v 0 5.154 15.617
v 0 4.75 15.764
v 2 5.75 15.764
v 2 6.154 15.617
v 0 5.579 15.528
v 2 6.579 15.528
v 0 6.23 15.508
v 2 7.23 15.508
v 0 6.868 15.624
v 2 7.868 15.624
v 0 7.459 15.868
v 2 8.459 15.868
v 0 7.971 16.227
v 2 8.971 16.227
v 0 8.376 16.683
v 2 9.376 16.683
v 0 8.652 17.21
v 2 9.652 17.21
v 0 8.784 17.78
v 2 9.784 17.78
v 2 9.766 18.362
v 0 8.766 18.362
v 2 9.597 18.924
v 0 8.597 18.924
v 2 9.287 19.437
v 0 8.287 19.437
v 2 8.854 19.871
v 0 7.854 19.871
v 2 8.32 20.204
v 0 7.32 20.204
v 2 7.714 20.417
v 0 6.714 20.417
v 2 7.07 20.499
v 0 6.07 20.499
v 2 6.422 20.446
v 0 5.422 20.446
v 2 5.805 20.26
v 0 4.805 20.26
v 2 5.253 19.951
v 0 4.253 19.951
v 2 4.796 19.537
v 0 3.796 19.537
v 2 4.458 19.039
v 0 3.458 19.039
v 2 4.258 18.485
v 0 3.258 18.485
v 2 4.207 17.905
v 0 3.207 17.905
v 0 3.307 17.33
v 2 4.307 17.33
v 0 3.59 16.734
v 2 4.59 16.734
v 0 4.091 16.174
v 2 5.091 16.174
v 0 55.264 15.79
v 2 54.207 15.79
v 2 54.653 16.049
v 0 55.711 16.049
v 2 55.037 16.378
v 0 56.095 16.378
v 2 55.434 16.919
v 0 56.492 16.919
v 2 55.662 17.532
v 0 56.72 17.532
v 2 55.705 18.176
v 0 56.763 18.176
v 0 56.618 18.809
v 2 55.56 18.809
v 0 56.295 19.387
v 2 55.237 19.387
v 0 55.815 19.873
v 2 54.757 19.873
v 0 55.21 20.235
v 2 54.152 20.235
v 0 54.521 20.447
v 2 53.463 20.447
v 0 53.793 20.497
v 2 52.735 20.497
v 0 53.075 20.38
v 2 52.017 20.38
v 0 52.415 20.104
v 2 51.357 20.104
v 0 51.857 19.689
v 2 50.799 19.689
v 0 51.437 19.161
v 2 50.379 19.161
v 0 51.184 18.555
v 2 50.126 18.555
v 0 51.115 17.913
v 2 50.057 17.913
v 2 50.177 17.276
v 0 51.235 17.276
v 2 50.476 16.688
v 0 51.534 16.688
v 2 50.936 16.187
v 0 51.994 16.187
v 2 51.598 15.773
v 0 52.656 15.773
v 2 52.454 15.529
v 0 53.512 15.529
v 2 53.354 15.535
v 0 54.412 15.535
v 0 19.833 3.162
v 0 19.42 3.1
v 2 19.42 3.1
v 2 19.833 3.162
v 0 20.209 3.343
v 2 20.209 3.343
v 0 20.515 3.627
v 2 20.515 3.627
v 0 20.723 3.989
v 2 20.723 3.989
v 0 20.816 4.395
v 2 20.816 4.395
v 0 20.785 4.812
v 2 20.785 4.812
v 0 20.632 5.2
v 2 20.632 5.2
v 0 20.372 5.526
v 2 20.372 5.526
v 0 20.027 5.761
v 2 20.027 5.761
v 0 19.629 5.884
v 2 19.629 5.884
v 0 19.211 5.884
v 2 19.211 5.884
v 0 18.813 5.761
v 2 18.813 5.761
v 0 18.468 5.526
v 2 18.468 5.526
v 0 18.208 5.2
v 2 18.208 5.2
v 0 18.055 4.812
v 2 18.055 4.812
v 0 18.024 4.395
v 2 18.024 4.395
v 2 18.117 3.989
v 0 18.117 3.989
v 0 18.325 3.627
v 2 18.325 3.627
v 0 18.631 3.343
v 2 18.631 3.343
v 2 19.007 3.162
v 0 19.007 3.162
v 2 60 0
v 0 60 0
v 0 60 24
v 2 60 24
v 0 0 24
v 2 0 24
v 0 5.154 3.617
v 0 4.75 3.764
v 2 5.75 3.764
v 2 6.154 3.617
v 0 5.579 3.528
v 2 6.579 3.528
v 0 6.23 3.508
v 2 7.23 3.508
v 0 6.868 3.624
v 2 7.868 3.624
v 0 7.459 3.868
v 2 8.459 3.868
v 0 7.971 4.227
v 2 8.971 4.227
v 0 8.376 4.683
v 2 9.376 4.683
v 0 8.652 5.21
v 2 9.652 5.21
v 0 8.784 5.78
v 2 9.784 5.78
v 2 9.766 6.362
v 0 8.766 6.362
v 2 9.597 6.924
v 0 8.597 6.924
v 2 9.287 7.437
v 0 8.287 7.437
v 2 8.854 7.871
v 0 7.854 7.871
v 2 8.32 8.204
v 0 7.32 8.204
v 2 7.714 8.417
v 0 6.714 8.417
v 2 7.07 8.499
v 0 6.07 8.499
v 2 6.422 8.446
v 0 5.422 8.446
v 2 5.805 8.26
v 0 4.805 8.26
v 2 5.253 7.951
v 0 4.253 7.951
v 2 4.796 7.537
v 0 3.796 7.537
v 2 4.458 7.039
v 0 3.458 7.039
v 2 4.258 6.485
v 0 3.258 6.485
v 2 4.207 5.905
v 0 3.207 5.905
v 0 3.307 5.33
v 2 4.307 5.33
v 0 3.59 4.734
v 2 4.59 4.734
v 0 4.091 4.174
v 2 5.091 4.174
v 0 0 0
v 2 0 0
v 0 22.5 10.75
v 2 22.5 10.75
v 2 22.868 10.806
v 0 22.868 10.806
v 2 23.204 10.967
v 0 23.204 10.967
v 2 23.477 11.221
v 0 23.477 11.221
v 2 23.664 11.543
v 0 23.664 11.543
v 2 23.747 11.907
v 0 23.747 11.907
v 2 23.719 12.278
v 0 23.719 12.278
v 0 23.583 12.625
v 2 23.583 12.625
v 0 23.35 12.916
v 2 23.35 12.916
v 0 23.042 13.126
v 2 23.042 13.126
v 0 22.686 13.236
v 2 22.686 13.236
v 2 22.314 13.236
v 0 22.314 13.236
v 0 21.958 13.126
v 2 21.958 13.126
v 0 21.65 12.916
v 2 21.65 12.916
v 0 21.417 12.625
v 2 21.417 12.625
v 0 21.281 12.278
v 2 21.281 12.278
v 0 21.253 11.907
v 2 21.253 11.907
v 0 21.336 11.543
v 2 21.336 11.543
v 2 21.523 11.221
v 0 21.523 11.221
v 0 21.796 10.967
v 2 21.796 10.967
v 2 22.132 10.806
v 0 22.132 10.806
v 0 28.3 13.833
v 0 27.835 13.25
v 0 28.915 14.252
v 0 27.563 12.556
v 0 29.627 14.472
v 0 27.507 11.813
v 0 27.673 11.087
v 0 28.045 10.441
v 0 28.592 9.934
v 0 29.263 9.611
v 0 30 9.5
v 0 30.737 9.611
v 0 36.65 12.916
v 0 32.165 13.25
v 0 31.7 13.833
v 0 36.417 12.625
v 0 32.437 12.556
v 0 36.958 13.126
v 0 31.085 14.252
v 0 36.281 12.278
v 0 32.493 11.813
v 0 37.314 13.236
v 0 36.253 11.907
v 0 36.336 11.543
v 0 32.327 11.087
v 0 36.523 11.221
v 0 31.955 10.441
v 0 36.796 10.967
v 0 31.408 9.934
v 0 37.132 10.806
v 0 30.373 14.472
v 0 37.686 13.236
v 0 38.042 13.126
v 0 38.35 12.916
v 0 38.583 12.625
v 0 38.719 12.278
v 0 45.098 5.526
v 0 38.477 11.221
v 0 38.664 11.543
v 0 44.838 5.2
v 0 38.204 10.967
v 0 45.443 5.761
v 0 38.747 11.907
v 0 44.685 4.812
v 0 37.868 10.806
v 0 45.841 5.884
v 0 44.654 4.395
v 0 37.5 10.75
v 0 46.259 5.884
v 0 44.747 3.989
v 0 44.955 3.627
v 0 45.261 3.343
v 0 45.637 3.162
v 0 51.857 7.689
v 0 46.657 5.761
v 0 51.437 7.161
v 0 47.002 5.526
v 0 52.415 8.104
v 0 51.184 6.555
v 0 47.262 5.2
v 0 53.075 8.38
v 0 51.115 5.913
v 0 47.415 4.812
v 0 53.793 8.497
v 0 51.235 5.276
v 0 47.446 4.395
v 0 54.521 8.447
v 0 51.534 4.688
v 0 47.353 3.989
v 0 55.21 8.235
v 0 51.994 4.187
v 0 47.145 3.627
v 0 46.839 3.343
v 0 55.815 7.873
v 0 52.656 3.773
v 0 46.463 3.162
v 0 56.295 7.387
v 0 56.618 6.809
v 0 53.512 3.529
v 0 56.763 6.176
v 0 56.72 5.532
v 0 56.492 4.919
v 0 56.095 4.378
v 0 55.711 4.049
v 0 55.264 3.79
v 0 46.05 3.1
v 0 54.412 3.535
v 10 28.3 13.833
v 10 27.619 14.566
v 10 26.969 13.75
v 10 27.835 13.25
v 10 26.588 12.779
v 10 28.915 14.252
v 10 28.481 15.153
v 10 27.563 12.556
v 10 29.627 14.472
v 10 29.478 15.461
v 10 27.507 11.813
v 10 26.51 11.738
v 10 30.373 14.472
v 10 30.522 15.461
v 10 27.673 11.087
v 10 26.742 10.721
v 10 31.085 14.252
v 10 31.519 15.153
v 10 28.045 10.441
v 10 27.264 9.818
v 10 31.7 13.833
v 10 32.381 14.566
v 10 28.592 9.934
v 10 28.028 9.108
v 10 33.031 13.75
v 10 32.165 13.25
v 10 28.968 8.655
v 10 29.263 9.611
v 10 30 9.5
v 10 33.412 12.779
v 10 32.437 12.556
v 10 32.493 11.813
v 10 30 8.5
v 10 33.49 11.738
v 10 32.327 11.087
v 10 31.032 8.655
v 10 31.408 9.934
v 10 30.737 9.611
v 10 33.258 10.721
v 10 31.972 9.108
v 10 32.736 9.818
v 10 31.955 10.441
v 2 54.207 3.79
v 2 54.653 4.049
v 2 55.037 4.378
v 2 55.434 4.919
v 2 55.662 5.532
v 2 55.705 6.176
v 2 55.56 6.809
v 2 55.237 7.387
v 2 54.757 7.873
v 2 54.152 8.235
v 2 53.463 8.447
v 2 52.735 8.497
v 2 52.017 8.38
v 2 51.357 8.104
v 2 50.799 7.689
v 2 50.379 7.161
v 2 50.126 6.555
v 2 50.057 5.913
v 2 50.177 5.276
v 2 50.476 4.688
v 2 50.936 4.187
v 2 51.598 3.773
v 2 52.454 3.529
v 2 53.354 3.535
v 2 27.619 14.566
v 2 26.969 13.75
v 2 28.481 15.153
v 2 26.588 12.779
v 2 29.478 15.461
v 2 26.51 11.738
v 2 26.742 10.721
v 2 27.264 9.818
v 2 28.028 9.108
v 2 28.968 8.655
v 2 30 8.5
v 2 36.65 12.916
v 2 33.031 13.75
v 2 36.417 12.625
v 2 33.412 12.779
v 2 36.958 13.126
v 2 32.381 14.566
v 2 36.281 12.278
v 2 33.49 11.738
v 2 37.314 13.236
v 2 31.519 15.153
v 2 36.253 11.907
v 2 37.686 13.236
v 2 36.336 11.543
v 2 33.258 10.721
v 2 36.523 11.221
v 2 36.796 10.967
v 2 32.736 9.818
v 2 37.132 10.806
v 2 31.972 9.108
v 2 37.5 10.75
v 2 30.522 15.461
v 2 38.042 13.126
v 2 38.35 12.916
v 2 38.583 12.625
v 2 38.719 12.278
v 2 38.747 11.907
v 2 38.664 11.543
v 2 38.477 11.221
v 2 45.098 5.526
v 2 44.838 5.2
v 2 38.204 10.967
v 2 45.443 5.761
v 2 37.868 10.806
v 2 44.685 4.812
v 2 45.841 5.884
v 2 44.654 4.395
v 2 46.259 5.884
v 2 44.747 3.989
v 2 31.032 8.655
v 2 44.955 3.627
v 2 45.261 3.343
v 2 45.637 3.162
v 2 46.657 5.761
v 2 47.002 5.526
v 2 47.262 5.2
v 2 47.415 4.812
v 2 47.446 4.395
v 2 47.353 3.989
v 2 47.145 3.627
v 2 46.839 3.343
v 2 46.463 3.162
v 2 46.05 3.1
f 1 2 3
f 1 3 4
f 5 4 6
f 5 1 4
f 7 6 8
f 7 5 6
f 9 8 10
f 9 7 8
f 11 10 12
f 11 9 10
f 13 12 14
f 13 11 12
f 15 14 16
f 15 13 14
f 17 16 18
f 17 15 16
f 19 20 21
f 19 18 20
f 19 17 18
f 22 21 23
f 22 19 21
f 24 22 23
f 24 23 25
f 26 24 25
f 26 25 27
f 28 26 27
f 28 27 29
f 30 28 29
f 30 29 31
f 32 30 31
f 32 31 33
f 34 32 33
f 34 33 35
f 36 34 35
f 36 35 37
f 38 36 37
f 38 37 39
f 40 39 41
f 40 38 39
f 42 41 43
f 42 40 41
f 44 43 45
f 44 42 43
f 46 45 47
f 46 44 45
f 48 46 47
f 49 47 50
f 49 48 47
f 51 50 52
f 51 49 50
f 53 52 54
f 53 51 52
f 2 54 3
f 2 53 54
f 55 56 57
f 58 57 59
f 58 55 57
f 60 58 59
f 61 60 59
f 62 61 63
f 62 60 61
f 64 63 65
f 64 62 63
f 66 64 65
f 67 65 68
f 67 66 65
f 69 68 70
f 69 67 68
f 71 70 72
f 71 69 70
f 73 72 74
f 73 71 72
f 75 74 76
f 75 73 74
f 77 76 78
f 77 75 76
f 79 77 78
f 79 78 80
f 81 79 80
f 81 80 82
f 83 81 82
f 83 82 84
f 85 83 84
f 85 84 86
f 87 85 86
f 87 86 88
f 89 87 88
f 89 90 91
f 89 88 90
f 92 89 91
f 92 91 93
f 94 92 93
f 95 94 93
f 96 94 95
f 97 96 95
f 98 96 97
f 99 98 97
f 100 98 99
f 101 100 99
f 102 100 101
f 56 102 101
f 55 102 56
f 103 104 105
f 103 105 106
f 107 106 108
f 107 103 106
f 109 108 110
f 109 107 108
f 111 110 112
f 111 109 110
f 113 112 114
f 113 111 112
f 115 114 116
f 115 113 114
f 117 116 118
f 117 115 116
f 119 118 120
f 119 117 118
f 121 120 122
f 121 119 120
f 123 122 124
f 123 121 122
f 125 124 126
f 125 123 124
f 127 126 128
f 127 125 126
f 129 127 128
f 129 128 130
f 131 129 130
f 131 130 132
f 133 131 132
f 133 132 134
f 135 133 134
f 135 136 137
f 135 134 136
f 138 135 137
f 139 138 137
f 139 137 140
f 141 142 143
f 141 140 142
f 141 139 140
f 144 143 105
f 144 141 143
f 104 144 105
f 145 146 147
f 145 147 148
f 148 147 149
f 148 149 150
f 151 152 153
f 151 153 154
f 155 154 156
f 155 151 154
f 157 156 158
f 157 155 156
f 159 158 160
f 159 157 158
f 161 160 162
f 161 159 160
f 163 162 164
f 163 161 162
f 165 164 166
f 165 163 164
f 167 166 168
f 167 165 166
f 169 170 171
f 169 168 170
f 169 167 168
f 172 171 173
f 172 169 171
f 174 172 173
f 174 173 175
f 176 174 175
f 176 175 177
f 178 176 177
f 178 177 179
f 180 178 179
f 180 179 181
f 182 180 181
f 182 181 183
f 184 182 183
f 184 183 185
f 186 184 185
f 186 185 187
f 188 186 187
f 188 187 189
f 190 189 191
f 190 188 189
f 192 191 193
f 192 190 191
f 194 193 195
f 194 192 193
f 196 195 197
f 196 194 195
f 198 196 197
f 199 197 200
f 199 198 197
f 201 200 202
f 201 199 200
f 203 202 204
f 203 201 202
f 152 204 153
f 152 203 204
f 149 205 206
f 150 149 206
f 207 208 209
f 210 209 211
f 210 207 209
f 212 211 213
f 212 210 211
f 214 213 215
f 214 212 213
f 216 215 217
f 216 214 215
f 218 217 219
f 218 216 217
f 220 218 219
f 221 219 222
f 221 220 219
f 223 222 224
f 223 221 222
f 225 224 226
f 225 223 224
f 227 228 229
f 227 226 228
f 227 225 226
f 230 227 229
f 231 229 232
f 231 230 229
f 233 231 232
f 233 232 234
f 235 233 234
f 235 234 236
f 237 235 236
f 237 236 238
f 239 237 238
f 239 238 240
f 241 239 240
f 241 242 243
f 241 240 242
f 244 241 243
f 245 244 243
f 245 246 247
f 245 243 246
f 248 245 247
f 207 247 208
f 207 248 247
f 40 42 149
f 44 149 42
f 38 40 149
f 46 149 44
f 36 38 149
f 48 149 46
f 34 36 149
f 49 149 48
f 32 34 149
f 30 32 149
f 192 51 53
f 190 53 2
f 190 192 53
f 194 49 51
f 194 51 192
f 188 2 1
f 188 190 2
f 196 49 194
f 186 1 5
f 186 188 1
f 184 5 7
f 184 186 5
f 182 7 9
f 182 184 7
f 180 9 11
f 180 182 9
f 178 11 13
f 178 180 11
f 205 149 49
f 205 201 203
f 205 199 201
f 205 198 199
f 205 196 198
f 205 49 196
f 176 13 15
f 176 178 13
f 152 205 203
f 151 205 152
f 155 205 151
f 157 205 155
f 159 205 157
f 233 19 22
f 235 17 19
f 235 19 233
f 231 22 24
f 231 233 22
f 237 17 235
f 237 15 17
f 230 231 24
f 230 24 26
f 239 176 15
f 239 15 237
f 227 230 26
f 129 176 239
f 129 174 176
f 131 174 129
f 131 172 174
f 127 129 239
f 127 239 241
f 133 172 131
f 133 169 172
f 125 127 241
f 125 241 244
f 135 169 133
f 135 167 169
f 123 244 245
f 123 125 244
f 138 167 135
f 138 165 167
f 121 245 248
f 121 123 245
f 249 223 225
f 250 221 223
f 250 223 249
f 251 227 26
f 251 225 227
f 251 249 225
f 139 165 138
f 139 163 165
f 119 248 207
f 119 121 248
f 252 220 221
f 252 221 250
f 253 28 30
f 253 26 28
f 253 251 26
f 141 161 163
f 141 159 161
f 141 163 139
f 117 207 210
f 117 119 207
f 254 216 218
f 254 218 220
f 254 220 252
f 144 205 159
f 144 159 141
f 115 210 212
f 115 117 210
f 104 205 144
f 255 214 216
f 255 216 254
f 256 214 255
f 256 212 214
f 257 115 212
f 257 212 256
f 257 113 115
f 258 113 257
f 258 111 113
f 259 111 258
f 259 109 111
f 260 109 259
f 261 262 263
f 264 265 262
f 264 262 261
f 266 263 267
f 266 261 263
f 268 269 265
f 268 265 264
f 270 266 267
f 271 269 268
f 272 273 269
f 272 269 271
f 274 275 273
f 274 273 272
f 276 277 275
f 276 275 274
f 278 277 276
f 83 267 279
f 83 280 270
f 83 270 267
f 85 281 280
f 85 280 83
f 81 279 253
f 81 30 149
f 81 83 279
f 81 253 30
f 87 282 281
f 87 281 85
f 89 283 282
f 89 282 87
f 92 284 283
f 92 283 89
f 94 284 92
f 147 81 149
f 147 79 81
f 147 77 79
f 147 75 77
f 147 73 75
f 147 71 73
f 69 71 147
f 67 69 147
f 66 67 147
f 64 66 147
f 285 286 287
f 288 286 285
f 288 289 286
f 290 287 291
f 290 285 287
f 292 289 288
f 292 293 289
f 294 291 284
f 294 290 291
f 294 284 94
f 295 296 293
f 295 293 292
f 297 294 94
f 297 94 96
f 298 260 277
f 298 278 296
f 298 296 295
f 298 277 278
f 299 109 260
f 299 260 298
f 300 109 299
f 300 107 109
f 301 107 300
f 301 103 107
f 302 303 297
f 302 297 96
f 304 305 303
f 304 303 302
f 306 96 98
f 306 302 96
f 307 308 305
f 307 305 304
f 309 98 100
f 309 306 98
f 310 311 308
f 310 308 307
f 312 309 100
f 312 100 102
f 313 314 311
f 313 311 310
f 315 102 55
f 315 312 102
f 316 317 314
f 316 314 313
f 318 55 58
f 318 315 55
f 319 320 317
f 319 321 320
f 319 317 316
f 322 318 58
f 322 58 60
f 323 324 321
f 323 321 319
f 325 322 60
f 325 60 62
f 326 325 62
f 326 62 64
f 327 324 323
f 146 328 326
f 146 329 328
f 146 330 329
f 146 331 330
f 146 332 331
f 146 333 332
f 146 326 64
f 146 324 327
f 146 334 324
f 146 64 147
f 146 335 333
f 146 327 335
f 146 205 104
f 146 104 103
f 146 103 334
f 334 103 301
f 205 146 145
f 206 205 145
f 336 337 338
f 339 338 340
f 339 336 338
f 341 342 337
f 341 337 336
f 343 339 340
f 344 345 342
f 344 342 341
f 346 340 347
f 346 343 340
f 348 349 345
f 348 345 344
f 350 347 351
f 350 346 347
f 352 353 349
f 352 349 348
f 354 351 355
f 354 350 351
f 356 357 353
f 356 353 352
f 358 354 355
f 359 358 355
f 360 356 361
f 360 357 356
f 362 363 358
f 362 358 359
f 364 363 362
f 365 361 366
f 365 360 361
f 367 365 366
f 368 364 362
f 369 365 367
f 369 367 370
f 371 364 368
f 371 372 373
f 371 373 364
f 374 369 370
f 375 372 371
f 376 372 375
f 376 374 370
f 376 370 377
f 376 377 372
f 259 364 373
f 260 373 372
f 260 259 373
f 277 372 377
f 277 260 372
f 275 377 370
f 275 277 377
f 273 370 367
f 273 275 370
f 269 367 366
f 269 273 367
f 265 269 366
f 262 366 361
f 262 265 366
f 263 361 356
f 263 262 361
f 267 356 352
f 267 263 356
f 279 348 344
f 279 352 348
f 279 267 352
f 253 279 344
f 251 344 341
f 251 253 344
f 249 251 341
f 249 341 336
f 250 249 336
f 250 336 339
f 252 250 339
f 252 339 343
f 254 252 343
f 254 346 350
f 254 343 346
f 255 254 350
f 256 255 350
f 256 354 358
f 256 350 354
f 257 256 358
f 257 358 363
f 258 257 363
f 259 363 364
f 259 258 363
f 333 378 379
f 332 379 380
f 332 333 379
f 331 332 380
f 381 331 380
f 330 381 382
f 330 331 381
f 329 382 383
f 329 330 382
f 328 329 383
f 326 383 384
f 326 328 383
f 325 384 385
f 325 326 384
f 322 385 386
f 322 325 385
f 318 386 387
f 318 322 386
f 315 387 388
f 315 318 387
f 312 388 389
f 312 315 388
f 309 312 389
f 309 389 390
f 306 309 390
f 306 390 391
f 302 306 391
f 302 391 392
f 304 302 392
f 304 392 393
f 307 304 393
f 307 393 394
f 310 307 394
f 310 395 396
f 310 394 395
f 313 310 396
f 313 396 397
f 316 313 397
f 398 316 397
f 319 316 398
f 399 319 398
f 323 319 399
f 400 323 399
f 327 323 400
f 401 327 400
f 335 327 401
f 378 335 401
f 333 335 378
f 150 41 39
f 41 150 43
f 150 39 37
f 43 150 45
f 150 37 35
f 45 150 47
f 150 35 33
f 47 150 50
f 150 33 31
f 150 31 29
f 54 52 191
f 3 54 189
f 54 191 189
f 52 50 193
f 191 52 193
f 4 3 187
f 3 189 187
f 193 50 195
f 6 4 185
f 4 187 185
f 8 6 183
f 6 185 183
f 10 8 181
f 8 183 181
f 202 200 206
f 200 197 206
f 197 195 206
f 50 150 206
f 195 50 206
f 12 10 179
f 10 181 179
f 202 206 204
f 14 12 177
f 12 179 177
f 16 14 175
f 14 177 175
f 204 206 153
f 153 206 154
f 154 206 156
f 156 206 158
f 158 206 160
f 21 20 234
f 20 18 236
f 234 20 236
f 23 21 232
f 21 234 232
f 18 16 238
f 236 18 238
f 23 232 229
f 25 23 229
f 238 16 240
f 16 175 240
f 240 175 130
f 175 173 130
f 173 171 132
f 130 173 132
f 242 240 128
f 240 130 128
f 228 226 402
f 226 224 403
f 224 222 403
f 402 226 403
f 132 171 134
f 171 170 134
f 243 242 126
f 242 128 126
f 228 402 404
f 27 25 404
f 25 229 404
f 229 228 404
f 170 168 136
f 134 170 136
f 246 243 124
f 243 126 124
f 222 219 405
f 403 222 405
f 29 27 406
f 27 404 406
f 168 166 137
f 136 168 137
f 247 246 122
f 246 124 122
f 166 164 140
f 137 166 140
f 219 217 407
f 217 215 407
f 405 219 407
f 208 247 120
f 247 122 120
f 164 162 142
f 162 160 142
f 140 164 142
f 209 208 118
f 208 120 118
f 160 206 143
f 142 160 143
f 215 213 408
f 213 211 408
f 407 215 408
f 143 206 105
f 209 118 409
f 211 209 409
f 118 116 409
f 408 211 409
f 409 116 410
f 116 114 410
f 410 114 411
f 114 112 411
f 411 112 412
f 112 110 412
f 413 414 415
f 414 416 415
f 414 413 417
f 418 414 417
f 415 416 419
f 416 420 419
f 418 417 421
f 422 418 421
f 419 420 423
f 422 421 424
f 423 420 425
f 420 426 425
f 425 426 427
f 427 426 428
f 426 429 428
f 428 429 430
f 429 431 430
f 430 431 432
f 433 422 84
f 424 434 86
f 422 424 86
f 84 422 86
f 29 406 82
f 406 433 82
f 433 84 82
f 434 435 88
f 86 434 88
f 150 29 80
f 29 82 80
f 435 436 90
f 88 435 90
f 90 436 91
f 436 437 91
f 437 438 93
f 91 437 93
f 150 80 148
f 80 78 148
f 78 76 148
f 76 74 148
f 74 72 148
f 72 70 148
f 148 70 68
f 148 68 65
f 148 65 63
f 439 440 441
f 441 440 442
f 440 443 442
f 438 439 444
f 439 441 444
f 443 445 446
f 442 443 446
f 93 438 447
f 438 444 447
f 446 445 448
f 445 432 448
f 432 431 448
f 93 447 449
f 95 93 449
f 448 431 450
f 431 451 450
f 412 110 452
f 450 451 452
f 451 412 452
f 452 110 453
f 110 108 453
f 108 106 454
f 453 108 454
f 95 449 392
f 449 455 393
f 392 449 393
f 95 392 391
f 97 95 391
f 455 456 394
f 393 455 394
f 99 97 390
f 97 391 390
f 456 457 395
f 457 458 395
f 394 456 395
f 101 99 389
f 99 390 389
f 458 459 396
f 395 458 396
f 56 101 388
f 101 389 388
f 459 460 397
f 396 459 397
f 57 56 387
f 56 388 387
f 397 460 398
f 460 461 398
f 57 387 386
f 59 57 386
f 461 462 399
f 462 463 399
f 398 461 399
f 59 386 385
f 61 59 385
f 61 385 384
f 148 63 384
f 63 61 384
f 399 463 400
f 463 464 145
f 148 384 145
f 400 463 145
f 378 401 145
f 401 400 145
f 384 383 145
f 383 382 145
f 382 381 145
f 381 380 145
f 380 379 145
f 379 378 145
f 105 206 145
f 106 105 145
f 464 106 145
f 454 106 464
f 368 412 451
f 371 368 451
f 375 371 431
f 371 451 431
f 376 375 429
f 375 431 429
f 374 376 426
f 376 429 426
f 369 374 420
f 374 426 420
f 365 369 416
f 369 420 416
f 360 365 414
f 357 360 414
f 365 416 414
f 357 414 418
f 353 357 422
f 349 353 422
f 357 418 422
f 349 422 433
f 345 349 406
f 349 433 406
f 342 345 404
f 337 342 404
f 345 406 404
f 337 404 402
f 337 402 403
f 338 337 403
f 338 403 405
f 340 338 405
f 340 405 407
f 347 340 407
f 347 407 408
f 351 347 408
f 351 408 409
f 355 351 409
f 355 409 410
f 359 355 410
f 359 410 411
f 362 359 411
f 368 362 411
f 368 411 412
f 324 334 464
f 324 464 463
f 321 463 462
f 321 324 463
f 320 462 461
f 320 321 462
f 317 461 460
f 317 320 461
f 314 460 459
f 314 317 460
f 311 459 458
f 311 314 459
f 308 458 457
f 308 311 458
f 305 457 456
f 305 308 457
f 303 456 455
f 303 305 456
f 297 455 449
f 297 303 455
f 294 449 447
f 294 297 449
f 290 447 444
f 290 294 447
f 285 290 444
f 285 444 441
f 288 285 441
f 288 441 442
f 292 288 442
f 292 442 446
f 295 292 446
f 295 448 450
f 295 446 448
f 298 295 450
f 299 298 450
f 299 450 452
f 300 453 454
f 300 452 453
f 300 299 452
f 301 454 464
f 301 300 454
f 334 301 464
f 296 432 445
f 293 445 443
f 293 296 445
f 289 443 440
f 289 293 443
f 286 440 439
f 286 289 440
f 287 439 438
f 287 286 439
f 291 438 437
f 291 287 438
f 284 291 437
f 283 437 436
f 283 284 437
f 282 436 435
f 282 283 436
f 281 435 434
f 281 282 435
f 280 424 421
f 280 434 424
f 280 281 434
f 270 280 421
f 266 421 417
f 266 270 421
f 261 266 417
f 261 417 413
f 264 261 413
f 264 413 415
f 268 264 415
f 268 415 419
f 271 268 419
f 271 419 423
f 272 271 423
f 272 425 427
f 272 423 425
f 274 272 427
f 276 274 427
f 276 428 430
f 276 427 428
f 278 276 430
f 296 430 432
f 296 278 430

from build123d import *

# Parameters (mm, degrees)
CYLINDER004_R               = 2.5
CYLINDER004_DEPTH           = 12
CYLINDER004_PITCH_ANGLE     = 90
CYLINDER003_R               = 3.5
CYLINDER003_DEPTH           = 10
CYLINDER003_PITCH_ANGLE     = 90
CYLINDER009_R               = 1.4
CYLINDER009_DEPTH           = 10
CYLINDER009_PITCH_ANGLE     = 90
CYLINDER008_R               = 1.4
CYLINDER008_DEPTH           = 10
CYLINDER008_PITCH_ANGLE     = 90
CYLINDER001_R               = 1.25
CYLINDER001_DEPTH           = 10
CYLINDER001_PITCH_ANGLE     = 90
CYLINDER002_R               = 1.25
CYLINDER002_DEPTH           = 10
CYLINDER002_PITCH_ANGLE     = 90
CYLINDER007_R               = 2.5
CYLINDER007_DEPTH           = 10
CYLINDER007_ROLL_ANGLE      = 90
CYLINDER007_PITCH_ANGLE     = 62.121453
CYLINDER007_PLACEMENT_ANGLE = 62.121453
CYLINDER006_R               = 2.5
CYLINDER006_DEPTH           = 10
CYLINDER006_ROLL_ANGLE      = 90
CYLINDER006_PITCH_ANGLE     = 62.121448
CYLINDER006_PLACEMENT_ANGLE = 62.121448
CYLINDER_R                  = 2.5
CYLINDER_DEPTH              = 10
CYLINDER_ROLL_ANGLE         = -90
CYLINDER_PITCH_ANGLE        = 63.434923
CYLINDER_PLACEMENT_ANGLE    = -63.434923
CYLINDER005_R               = 2.5
CYLINDER005_DEPTH           = 10
CYLINDER005_ROLL_ANGLE      = -90
CYLINDER005_PITCH_ANGLE     = 63.434923
CYLINDER005_PLACEMENT_ANGLE = -63.434923
BOX_W                       = 2
BOX_H                       = 60
BOX_DEPTH                   = 24


with BuildPart() as zylinder004:
    # Cylinder004 → Cylinder004 (new body)
    with BuildSketch(Plane.XY):
        Circle(CYLINDER004_R)
    extrude(amount=CYLINDER004_DEPTH)


with BuildPart() as zylinder004_1:
    # Cylinder004 pitch: moved
    add(zylinder004.part.rotate(Axis((0, 0, 0), (0, 1, 0)), CYLINDER004_PITCH_ANGLE))


with BuildPart() as zylinder004_2:
    # Cylinder004 placement: moved
    add(zylinder004_1.part.moved(Location((0, 30, 12))))


with BuildPart() as cut006:
    # Cylinder003 → Cylinder003 (new body)
    with BuildSketch(Plane.XY):
        Circle(CYLINDER003_R)
    extrude(amount=CYLINDER003_DEPTH)


with BuildPart() as cut006_1:
    # Cylinder003 pitch: moved
    add(cut006.part.rotate(Axis((0, 0, 0), (0, 1, 0)), CYLINDER003_PITCH_ANGLE))


with BuildPart() as cut006_2:
    # Cylinder003 placement: moved
    add(cut006_1.part.moved(Location((0, 30, 12))))

    # Cut006: cut Zylinder004
    add(zylinder004_2.part, mode=Mode.SUBTRACT)


with BuildPart() as zylinder009:
    # Cylinder009 → Cylinder009 (new body)
    with BuildSketch(Plane.XY):
        Circle(CYLINDER009_R)
    extrude(amount=CYLINDER009_DEPTH)


with BuildPart() as zylinder009_1:
    # Cylinder009 pitch: moved
    add(zylinder009.part.rotate(Axis((0, 0, 0), (0, 1, 0)), CYLINDER009_PITCH_ANGLE))


with BuildPart() as zylinder009_2:
    # Cylinder009 placement: moved
    add(zylinder009_1.part.moved(Location((-1, 46.05, 4.5))))


with BuildPart() as zylinder008:
    # Cylinder008 → Cylinder008 (new body)
    with BuildSketch(Plane.XY):
        Circle(CYLINDER008_R)
    extrude(amount=CYLINDER008_DEPTH)


with BuildPart() as zylinder008_1:
    # Cylinder008 pitch: moved
    add(zylinder008.part.rotate(Axis((0, 0, 0), (0, 1, 0)), CYLINDER008_PITCH_ANGLE))


with BuildPart() as zylinder008_2:
    # Cylinder008 placement: moved
    add(zylinder008_1.part.moved(Location((-1, 19.42, 4.5))))


with BuildPart() as zylinder001:
    # Cylinder001 → Cylinder001 (new body)
    with BuildSketch(Plane.XY):
        Circle(CYLINDER001_R)
    extrude(amount=CYLINDER001_DEPTH)


with BuildPart() as zylinder001_1:
    # Cylinder001 pitch: moved
    add(zylinder001.part.rotate(Axis((0, 0, 0), (0, 1, 0)), CYLINDER001_PITCH_ANGLE))


with BuildPart() as zylinder001_2:
    # Cylinder001 placement: moved
    add(zylinder001_1.part.moved(Location((0, 22.5, 12))))


with BuildPart() as zylinder002:
    # Cylinder002 → Cylinder002 (new body)
    with BuildSketch(Plane.XY):
        Circle(CYLINDER002_R)
    extrude(amount=CYLINDER002_DEPTH)


with BuildPart() as zylinder002_1:
    # Cylinder002 pitch: moved
    add(zylinder002.part.rotate(Axis((0, 0, 0), (0, 1, 0)), CYLINDER002_PITCH_ANGLE))


with BuildPart() as zylinder002_2:
    # Cylinder002 placement: moved
    add(zylinder002_1.part.moved(Location((0, 37.5, 12))))


with BuildPart() as zylinder007:
    # Cylinder007 → Cylinder007 (new body)
    with BuildSketch(Plane.XY):
        Circle(CYLINDER007_R)
    extrude(amount=CYLINDER007_DEPTH)


with BuildPart() as zylinder007_1:
    # Cylinder007 roll: moved
    add(zylinder007.part.rotate(Axis((0, 0, 0), (1, 0, 0)), CYLINDER007_ROLL_ANGLE))


with BuildPart() as zylinder007_2:
    # Cylinder007 pitch: moved
    add(zylinder007_1.part.rotate(Axis((0, 0, 0), (0, 1, 0)), CYLINDER007_PITCH_ANGLE))


with BuildPart() as zylinder007_3:
    # Cylinder007 placement: moved
    add(zylinder007_2.part.moved(Location((-2, 55, 6))).rotate(Axis((-2, 55, 6), (0, 0, 1)), CYLINDER007_PLACEMENT_ANGLE))


with BuildPart() as zylinder006:
    # Cylinder006 → Cylinder006 (new body)
    with BuildSketch(Plane.XY):
        Circle(CYLINDER006_R)
    extrude(amount=CYLINDER006_DEPTH)


with BuildPart() as zylinder006_1:
    # Cylinder006 roll: moved
    add(zylinder006.part.rotate(Axis((0, 0, 0), (1, 0, 0)), CYLINDER006_ROLL_ANGLE))


with BuildPart() as zylinder006_2:
    # Cylinder006 pitch: moved
    add(zylinder006_1.part.rotate(Axis((0, 0, 0), (0, 1, 0)), CYLINDER006_PITCH_ANGLE))


with BuildPart() as zylinder006_3:
    # Cylinder006 placement: moved
    add(zylinder006_2.part.moved(Location((-2, 55, 18))).rotate(Axis((-2, 55, 18), (0, 0, 1)), CYLINDER006_PLACEMENT_ANGLE))


with BuildPart() as zylinder:
    # Cylinder → Cylinder (new body)
    with BuildSketch(Plane.XY):
        Circle(CYLINDER_R)
    extrude(amount=CYLINDER_DEPTH)


with BuildPart() as zylinder_1:
    # Cylinder roll: moved
    add(zylinder.part.rotate(Axis((0, 0, 0), (1, 0, 0)), CYLINDER_ROLL_ANGLE))


with BuildPart() as zylinder_2:
    # Cylinder pitch: moved
    add(zylinder_1.part.rotate(Axis((0, 0, 0), (0, 1, 0)), CYLINDER_PITCH_ANGLE))


with BuildPart() as zylinder_3:
    # Cylinder placement: moved
    add(zylinder_2.part.moved(Location((-2, 5, 6))).rotate(Axis((-2, 5, 6), (0, 0, 1)), CYLINDER_PLACEMENT_ANGLE))


with BuildPart() as zylinder005:
    # Cylinder005 → Cylinder005 (new body)
    with BuildSketch(Plane.XY):
        Circle(CYLINDER005_R)
    extrude(amount=CYLINDER005_DEPTH)


with BuildPart() as zylinder005_1:
    # Cylinder005 roll: moved
    add(zylinder005.part.rotate(Axis((0, 0, 0), (1, 0, 0)), CYLINDER005_ROLL_ANGLE))


with BuildPart() as zylinder005_2:
    # Cylinder005 pitch: moved
    add(zylinder005_1.part.rotate(Axis((0, 0, 0), (0, 1, 0)), CYLINDER005_PITCH_ANGLE))


with BuildPart() as zylinder005_3:
    # Cylinder005 placement: moved
    add(zylinder005_2.part.moved(Location((-2, 5, 18))).rotate(Axis((-2, 5, 18), (0, 0, 1)), CYLINDER005_PLACEMENT_ANGLE))


with BuildPart() as fusion:
    # Box → Box (new body)
    with BuildSketch(Plane.XY):
        with Locations((1, 30)):
            Rectangle(BOX_W, BOX_H)
    extrude(amount=BOX_DEPTH)

    # Cut: cut Zylinder005
    add(zylinder005_3.part, mode=Mode.SUBTRACT)

    # Cut001: cut Zylinder
    add(zylinder_3.part, mode=Mode.SUBTRACT)

    # Cut002: cut Zylinder006
    add(zylinder006_3.part, mode=Mode.SUBTRACT)

    # Cut003: cut Zylinder007
    add(zylinder007_3.part, mode=Mode.SUBTRACT)

    # Cut004: cut Zylinder002
    add(zylinder002_2.part, mode=Mode.SUBTRACT)

    # Cut005: cut Zylinder001
    add(zylinder001_2.part, mode=Mode.SUBTRACT)

    # Cut007: cut Zylinder004
    add(zylinder004_2.part, mode=Mode.SUBTRACT)

    # Cut008: cut Zylinder008
    add(zylinder008_2.part, mode=Mode.SUBTRACT)

    # Cut009: cut Zylinder009
    add(zylinder009_2.part, mode=Mode.SUBTRACT)

    # Fusion: union Cut006
    add(cut006_2.part)


solid = fusion.part
